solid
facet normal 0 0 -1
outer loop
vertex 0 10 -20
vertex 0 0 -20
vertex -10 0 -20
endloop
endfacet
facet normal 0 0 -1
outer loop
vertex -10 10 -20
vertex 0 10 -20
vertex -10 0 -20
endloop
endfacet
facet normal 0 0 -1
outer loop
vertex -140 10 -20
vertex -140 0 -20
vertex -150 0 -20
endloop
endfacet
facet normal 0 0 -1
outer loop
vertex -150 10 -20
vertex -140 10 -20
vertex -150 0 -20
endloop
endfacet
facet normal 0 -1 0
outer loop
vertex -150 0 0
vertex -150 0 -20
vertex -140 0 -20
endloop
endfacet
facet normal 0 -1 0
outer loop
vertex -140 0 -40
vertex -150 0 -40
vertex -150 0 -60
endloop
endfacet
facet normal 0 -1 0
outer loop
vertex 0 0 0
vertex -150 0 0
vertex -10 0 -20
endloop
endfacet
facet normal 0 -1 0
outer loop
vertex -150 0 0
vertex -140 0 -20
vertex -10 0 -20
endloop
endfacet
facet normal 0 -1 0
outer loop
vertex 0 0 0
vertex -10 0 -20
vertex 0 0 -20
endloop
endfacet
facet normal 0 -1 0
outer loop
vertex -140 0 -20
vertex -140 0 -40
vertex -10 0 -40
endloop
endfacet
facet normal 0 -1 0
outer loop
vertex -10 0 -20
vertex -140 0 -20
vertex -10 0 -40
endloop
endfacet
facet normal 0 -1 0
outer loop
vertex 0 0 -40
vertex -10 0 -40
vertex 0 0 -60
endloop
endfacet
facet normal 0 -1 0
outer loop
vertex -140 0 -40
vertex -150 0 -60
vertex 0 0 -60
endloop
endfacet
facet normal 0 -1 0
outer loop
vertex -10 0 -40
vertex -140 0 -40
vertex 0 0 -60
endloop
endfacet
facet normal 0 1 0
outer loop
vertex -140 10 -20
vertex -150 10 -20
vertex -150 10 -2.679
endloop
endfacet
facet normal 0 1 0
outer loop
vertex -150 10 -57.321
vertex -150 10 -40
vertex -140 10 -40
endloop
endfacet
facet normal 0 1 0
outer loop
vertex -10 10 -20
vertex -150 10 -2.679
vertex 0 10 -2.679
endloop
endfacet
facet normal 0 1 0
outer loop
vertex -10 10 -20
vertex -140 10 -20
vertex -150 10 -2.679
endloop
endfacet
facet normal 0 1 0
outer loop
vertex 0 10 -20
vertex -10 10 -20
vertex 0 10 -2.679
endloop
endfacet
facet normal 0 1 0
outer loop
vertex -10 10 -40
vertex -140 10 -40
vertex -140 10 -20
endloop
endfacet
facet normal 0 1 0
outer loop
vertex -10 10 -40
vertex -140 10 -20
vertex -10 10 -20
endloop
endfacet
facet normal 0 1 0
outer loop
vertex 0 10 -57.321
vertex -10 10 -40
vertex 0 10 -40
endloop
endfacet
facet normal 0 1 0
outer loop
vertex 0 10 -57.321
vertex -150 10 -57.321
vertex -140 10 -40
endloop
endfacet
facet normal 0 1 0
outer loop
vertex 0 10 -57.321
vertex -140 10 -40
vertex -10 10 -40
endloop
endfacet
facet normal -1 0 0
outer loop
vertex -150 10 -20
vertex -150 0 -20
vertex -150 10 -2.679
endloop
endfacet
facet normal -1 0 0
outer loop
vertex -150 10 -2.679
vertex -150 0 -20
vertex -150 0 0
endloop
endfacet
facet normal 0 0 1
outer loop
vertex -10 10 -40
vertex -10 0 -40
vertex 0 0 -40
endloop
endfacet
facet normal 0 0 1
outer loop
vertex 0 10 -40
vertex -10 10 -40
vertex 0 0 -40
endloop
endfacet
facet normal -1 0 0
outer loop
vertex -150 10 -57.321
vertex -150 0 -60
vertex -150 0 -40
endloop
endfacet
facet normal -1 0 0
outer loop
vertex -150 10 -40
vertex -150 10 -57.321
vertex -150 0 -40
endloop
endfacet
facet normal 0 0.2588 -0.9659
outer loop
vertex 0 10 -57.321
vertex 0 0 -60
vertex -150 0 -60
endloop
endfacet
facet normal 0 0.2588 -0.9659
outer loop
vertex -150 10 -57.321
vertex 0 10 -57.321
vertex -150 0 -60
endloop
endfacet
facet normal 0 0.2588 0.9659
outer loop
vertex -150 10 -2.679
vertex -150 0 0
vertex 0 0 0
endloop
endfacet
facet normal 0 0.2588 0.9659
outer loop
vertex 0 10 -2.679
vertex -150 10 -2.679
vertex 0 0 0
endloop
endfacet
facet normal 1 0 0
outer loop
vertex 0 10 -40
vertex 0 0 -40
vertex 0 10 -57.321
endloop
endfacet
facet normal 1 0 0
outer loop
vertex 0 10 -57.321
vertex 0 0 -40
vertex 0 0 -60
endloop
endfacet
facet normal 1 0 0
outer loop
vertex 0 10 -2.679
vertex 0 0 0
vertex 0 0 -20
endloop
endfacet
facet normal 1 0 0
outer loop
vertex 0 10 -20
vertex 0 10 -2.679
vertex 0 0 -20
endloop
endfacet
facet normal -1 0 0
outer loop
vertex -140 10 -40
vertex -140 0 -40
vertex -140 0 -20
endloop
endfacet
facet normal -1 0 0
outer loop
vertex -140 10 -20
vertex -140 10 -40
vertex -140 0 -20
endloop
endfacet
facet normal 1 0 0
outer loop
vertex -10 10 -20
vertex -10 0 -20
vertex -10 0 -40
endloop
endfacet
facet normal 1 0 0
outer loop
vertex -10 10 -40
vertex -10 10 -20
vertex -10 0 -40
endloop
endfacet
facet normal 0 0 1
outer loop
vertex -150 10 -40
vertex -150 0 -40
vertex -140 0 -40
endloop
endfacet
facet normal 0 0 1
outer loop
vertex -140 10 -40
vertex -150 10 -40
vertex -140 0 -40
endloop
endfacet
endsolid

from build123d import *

# Parameters (mm, degrees)
BOSS_EXTRUDE1_DEPTH = 10
DRAFT21_ANGLE       = -15
DRAFT22_ANGLE       = -15


with BuildPart() as part:
    # Sketch1 → Boss-Extrude1 (new body)
    with BuildSketch(Plane(origin=(0, 0, 0), x_dir=(1, 0, 0), z_dir=(0, 1, 0))):
        Polygon((0, 0), (0, 20), (-10, 20), (-10, 40), (0, 40), (0, 60), (-150, 60), (-150, 40), (-140, 40), (-140, 20), (-150, 20), (-150, 0), align=None)
    extrude(amount=BOSS_EXTRUDE1_DEPTH)

    # Draft21
    draft21_faces = [part.faces().sort_by_distance(p)[0] for p in [
        (-75, 5, 0),
    ]]
    draft(draft21_faces, Plane(origin=(0, 0, 0), x_dir=(0, 0, -1), z_dir=(0, -1, 0)), DRAFT21_ANGLE)

    # Draft22
    draft22_faces = [part.faces().sort_by_distance(p)[0] for p in [
        (-75, 5, -60),
    ]]
    draft(draft22_faces, Plane(origin=(0, 0, 0), x_dir=(0, 0, -1), z_dir=(0, -1, 0)), DRAFT22_ANGLE)


solid = part.part
